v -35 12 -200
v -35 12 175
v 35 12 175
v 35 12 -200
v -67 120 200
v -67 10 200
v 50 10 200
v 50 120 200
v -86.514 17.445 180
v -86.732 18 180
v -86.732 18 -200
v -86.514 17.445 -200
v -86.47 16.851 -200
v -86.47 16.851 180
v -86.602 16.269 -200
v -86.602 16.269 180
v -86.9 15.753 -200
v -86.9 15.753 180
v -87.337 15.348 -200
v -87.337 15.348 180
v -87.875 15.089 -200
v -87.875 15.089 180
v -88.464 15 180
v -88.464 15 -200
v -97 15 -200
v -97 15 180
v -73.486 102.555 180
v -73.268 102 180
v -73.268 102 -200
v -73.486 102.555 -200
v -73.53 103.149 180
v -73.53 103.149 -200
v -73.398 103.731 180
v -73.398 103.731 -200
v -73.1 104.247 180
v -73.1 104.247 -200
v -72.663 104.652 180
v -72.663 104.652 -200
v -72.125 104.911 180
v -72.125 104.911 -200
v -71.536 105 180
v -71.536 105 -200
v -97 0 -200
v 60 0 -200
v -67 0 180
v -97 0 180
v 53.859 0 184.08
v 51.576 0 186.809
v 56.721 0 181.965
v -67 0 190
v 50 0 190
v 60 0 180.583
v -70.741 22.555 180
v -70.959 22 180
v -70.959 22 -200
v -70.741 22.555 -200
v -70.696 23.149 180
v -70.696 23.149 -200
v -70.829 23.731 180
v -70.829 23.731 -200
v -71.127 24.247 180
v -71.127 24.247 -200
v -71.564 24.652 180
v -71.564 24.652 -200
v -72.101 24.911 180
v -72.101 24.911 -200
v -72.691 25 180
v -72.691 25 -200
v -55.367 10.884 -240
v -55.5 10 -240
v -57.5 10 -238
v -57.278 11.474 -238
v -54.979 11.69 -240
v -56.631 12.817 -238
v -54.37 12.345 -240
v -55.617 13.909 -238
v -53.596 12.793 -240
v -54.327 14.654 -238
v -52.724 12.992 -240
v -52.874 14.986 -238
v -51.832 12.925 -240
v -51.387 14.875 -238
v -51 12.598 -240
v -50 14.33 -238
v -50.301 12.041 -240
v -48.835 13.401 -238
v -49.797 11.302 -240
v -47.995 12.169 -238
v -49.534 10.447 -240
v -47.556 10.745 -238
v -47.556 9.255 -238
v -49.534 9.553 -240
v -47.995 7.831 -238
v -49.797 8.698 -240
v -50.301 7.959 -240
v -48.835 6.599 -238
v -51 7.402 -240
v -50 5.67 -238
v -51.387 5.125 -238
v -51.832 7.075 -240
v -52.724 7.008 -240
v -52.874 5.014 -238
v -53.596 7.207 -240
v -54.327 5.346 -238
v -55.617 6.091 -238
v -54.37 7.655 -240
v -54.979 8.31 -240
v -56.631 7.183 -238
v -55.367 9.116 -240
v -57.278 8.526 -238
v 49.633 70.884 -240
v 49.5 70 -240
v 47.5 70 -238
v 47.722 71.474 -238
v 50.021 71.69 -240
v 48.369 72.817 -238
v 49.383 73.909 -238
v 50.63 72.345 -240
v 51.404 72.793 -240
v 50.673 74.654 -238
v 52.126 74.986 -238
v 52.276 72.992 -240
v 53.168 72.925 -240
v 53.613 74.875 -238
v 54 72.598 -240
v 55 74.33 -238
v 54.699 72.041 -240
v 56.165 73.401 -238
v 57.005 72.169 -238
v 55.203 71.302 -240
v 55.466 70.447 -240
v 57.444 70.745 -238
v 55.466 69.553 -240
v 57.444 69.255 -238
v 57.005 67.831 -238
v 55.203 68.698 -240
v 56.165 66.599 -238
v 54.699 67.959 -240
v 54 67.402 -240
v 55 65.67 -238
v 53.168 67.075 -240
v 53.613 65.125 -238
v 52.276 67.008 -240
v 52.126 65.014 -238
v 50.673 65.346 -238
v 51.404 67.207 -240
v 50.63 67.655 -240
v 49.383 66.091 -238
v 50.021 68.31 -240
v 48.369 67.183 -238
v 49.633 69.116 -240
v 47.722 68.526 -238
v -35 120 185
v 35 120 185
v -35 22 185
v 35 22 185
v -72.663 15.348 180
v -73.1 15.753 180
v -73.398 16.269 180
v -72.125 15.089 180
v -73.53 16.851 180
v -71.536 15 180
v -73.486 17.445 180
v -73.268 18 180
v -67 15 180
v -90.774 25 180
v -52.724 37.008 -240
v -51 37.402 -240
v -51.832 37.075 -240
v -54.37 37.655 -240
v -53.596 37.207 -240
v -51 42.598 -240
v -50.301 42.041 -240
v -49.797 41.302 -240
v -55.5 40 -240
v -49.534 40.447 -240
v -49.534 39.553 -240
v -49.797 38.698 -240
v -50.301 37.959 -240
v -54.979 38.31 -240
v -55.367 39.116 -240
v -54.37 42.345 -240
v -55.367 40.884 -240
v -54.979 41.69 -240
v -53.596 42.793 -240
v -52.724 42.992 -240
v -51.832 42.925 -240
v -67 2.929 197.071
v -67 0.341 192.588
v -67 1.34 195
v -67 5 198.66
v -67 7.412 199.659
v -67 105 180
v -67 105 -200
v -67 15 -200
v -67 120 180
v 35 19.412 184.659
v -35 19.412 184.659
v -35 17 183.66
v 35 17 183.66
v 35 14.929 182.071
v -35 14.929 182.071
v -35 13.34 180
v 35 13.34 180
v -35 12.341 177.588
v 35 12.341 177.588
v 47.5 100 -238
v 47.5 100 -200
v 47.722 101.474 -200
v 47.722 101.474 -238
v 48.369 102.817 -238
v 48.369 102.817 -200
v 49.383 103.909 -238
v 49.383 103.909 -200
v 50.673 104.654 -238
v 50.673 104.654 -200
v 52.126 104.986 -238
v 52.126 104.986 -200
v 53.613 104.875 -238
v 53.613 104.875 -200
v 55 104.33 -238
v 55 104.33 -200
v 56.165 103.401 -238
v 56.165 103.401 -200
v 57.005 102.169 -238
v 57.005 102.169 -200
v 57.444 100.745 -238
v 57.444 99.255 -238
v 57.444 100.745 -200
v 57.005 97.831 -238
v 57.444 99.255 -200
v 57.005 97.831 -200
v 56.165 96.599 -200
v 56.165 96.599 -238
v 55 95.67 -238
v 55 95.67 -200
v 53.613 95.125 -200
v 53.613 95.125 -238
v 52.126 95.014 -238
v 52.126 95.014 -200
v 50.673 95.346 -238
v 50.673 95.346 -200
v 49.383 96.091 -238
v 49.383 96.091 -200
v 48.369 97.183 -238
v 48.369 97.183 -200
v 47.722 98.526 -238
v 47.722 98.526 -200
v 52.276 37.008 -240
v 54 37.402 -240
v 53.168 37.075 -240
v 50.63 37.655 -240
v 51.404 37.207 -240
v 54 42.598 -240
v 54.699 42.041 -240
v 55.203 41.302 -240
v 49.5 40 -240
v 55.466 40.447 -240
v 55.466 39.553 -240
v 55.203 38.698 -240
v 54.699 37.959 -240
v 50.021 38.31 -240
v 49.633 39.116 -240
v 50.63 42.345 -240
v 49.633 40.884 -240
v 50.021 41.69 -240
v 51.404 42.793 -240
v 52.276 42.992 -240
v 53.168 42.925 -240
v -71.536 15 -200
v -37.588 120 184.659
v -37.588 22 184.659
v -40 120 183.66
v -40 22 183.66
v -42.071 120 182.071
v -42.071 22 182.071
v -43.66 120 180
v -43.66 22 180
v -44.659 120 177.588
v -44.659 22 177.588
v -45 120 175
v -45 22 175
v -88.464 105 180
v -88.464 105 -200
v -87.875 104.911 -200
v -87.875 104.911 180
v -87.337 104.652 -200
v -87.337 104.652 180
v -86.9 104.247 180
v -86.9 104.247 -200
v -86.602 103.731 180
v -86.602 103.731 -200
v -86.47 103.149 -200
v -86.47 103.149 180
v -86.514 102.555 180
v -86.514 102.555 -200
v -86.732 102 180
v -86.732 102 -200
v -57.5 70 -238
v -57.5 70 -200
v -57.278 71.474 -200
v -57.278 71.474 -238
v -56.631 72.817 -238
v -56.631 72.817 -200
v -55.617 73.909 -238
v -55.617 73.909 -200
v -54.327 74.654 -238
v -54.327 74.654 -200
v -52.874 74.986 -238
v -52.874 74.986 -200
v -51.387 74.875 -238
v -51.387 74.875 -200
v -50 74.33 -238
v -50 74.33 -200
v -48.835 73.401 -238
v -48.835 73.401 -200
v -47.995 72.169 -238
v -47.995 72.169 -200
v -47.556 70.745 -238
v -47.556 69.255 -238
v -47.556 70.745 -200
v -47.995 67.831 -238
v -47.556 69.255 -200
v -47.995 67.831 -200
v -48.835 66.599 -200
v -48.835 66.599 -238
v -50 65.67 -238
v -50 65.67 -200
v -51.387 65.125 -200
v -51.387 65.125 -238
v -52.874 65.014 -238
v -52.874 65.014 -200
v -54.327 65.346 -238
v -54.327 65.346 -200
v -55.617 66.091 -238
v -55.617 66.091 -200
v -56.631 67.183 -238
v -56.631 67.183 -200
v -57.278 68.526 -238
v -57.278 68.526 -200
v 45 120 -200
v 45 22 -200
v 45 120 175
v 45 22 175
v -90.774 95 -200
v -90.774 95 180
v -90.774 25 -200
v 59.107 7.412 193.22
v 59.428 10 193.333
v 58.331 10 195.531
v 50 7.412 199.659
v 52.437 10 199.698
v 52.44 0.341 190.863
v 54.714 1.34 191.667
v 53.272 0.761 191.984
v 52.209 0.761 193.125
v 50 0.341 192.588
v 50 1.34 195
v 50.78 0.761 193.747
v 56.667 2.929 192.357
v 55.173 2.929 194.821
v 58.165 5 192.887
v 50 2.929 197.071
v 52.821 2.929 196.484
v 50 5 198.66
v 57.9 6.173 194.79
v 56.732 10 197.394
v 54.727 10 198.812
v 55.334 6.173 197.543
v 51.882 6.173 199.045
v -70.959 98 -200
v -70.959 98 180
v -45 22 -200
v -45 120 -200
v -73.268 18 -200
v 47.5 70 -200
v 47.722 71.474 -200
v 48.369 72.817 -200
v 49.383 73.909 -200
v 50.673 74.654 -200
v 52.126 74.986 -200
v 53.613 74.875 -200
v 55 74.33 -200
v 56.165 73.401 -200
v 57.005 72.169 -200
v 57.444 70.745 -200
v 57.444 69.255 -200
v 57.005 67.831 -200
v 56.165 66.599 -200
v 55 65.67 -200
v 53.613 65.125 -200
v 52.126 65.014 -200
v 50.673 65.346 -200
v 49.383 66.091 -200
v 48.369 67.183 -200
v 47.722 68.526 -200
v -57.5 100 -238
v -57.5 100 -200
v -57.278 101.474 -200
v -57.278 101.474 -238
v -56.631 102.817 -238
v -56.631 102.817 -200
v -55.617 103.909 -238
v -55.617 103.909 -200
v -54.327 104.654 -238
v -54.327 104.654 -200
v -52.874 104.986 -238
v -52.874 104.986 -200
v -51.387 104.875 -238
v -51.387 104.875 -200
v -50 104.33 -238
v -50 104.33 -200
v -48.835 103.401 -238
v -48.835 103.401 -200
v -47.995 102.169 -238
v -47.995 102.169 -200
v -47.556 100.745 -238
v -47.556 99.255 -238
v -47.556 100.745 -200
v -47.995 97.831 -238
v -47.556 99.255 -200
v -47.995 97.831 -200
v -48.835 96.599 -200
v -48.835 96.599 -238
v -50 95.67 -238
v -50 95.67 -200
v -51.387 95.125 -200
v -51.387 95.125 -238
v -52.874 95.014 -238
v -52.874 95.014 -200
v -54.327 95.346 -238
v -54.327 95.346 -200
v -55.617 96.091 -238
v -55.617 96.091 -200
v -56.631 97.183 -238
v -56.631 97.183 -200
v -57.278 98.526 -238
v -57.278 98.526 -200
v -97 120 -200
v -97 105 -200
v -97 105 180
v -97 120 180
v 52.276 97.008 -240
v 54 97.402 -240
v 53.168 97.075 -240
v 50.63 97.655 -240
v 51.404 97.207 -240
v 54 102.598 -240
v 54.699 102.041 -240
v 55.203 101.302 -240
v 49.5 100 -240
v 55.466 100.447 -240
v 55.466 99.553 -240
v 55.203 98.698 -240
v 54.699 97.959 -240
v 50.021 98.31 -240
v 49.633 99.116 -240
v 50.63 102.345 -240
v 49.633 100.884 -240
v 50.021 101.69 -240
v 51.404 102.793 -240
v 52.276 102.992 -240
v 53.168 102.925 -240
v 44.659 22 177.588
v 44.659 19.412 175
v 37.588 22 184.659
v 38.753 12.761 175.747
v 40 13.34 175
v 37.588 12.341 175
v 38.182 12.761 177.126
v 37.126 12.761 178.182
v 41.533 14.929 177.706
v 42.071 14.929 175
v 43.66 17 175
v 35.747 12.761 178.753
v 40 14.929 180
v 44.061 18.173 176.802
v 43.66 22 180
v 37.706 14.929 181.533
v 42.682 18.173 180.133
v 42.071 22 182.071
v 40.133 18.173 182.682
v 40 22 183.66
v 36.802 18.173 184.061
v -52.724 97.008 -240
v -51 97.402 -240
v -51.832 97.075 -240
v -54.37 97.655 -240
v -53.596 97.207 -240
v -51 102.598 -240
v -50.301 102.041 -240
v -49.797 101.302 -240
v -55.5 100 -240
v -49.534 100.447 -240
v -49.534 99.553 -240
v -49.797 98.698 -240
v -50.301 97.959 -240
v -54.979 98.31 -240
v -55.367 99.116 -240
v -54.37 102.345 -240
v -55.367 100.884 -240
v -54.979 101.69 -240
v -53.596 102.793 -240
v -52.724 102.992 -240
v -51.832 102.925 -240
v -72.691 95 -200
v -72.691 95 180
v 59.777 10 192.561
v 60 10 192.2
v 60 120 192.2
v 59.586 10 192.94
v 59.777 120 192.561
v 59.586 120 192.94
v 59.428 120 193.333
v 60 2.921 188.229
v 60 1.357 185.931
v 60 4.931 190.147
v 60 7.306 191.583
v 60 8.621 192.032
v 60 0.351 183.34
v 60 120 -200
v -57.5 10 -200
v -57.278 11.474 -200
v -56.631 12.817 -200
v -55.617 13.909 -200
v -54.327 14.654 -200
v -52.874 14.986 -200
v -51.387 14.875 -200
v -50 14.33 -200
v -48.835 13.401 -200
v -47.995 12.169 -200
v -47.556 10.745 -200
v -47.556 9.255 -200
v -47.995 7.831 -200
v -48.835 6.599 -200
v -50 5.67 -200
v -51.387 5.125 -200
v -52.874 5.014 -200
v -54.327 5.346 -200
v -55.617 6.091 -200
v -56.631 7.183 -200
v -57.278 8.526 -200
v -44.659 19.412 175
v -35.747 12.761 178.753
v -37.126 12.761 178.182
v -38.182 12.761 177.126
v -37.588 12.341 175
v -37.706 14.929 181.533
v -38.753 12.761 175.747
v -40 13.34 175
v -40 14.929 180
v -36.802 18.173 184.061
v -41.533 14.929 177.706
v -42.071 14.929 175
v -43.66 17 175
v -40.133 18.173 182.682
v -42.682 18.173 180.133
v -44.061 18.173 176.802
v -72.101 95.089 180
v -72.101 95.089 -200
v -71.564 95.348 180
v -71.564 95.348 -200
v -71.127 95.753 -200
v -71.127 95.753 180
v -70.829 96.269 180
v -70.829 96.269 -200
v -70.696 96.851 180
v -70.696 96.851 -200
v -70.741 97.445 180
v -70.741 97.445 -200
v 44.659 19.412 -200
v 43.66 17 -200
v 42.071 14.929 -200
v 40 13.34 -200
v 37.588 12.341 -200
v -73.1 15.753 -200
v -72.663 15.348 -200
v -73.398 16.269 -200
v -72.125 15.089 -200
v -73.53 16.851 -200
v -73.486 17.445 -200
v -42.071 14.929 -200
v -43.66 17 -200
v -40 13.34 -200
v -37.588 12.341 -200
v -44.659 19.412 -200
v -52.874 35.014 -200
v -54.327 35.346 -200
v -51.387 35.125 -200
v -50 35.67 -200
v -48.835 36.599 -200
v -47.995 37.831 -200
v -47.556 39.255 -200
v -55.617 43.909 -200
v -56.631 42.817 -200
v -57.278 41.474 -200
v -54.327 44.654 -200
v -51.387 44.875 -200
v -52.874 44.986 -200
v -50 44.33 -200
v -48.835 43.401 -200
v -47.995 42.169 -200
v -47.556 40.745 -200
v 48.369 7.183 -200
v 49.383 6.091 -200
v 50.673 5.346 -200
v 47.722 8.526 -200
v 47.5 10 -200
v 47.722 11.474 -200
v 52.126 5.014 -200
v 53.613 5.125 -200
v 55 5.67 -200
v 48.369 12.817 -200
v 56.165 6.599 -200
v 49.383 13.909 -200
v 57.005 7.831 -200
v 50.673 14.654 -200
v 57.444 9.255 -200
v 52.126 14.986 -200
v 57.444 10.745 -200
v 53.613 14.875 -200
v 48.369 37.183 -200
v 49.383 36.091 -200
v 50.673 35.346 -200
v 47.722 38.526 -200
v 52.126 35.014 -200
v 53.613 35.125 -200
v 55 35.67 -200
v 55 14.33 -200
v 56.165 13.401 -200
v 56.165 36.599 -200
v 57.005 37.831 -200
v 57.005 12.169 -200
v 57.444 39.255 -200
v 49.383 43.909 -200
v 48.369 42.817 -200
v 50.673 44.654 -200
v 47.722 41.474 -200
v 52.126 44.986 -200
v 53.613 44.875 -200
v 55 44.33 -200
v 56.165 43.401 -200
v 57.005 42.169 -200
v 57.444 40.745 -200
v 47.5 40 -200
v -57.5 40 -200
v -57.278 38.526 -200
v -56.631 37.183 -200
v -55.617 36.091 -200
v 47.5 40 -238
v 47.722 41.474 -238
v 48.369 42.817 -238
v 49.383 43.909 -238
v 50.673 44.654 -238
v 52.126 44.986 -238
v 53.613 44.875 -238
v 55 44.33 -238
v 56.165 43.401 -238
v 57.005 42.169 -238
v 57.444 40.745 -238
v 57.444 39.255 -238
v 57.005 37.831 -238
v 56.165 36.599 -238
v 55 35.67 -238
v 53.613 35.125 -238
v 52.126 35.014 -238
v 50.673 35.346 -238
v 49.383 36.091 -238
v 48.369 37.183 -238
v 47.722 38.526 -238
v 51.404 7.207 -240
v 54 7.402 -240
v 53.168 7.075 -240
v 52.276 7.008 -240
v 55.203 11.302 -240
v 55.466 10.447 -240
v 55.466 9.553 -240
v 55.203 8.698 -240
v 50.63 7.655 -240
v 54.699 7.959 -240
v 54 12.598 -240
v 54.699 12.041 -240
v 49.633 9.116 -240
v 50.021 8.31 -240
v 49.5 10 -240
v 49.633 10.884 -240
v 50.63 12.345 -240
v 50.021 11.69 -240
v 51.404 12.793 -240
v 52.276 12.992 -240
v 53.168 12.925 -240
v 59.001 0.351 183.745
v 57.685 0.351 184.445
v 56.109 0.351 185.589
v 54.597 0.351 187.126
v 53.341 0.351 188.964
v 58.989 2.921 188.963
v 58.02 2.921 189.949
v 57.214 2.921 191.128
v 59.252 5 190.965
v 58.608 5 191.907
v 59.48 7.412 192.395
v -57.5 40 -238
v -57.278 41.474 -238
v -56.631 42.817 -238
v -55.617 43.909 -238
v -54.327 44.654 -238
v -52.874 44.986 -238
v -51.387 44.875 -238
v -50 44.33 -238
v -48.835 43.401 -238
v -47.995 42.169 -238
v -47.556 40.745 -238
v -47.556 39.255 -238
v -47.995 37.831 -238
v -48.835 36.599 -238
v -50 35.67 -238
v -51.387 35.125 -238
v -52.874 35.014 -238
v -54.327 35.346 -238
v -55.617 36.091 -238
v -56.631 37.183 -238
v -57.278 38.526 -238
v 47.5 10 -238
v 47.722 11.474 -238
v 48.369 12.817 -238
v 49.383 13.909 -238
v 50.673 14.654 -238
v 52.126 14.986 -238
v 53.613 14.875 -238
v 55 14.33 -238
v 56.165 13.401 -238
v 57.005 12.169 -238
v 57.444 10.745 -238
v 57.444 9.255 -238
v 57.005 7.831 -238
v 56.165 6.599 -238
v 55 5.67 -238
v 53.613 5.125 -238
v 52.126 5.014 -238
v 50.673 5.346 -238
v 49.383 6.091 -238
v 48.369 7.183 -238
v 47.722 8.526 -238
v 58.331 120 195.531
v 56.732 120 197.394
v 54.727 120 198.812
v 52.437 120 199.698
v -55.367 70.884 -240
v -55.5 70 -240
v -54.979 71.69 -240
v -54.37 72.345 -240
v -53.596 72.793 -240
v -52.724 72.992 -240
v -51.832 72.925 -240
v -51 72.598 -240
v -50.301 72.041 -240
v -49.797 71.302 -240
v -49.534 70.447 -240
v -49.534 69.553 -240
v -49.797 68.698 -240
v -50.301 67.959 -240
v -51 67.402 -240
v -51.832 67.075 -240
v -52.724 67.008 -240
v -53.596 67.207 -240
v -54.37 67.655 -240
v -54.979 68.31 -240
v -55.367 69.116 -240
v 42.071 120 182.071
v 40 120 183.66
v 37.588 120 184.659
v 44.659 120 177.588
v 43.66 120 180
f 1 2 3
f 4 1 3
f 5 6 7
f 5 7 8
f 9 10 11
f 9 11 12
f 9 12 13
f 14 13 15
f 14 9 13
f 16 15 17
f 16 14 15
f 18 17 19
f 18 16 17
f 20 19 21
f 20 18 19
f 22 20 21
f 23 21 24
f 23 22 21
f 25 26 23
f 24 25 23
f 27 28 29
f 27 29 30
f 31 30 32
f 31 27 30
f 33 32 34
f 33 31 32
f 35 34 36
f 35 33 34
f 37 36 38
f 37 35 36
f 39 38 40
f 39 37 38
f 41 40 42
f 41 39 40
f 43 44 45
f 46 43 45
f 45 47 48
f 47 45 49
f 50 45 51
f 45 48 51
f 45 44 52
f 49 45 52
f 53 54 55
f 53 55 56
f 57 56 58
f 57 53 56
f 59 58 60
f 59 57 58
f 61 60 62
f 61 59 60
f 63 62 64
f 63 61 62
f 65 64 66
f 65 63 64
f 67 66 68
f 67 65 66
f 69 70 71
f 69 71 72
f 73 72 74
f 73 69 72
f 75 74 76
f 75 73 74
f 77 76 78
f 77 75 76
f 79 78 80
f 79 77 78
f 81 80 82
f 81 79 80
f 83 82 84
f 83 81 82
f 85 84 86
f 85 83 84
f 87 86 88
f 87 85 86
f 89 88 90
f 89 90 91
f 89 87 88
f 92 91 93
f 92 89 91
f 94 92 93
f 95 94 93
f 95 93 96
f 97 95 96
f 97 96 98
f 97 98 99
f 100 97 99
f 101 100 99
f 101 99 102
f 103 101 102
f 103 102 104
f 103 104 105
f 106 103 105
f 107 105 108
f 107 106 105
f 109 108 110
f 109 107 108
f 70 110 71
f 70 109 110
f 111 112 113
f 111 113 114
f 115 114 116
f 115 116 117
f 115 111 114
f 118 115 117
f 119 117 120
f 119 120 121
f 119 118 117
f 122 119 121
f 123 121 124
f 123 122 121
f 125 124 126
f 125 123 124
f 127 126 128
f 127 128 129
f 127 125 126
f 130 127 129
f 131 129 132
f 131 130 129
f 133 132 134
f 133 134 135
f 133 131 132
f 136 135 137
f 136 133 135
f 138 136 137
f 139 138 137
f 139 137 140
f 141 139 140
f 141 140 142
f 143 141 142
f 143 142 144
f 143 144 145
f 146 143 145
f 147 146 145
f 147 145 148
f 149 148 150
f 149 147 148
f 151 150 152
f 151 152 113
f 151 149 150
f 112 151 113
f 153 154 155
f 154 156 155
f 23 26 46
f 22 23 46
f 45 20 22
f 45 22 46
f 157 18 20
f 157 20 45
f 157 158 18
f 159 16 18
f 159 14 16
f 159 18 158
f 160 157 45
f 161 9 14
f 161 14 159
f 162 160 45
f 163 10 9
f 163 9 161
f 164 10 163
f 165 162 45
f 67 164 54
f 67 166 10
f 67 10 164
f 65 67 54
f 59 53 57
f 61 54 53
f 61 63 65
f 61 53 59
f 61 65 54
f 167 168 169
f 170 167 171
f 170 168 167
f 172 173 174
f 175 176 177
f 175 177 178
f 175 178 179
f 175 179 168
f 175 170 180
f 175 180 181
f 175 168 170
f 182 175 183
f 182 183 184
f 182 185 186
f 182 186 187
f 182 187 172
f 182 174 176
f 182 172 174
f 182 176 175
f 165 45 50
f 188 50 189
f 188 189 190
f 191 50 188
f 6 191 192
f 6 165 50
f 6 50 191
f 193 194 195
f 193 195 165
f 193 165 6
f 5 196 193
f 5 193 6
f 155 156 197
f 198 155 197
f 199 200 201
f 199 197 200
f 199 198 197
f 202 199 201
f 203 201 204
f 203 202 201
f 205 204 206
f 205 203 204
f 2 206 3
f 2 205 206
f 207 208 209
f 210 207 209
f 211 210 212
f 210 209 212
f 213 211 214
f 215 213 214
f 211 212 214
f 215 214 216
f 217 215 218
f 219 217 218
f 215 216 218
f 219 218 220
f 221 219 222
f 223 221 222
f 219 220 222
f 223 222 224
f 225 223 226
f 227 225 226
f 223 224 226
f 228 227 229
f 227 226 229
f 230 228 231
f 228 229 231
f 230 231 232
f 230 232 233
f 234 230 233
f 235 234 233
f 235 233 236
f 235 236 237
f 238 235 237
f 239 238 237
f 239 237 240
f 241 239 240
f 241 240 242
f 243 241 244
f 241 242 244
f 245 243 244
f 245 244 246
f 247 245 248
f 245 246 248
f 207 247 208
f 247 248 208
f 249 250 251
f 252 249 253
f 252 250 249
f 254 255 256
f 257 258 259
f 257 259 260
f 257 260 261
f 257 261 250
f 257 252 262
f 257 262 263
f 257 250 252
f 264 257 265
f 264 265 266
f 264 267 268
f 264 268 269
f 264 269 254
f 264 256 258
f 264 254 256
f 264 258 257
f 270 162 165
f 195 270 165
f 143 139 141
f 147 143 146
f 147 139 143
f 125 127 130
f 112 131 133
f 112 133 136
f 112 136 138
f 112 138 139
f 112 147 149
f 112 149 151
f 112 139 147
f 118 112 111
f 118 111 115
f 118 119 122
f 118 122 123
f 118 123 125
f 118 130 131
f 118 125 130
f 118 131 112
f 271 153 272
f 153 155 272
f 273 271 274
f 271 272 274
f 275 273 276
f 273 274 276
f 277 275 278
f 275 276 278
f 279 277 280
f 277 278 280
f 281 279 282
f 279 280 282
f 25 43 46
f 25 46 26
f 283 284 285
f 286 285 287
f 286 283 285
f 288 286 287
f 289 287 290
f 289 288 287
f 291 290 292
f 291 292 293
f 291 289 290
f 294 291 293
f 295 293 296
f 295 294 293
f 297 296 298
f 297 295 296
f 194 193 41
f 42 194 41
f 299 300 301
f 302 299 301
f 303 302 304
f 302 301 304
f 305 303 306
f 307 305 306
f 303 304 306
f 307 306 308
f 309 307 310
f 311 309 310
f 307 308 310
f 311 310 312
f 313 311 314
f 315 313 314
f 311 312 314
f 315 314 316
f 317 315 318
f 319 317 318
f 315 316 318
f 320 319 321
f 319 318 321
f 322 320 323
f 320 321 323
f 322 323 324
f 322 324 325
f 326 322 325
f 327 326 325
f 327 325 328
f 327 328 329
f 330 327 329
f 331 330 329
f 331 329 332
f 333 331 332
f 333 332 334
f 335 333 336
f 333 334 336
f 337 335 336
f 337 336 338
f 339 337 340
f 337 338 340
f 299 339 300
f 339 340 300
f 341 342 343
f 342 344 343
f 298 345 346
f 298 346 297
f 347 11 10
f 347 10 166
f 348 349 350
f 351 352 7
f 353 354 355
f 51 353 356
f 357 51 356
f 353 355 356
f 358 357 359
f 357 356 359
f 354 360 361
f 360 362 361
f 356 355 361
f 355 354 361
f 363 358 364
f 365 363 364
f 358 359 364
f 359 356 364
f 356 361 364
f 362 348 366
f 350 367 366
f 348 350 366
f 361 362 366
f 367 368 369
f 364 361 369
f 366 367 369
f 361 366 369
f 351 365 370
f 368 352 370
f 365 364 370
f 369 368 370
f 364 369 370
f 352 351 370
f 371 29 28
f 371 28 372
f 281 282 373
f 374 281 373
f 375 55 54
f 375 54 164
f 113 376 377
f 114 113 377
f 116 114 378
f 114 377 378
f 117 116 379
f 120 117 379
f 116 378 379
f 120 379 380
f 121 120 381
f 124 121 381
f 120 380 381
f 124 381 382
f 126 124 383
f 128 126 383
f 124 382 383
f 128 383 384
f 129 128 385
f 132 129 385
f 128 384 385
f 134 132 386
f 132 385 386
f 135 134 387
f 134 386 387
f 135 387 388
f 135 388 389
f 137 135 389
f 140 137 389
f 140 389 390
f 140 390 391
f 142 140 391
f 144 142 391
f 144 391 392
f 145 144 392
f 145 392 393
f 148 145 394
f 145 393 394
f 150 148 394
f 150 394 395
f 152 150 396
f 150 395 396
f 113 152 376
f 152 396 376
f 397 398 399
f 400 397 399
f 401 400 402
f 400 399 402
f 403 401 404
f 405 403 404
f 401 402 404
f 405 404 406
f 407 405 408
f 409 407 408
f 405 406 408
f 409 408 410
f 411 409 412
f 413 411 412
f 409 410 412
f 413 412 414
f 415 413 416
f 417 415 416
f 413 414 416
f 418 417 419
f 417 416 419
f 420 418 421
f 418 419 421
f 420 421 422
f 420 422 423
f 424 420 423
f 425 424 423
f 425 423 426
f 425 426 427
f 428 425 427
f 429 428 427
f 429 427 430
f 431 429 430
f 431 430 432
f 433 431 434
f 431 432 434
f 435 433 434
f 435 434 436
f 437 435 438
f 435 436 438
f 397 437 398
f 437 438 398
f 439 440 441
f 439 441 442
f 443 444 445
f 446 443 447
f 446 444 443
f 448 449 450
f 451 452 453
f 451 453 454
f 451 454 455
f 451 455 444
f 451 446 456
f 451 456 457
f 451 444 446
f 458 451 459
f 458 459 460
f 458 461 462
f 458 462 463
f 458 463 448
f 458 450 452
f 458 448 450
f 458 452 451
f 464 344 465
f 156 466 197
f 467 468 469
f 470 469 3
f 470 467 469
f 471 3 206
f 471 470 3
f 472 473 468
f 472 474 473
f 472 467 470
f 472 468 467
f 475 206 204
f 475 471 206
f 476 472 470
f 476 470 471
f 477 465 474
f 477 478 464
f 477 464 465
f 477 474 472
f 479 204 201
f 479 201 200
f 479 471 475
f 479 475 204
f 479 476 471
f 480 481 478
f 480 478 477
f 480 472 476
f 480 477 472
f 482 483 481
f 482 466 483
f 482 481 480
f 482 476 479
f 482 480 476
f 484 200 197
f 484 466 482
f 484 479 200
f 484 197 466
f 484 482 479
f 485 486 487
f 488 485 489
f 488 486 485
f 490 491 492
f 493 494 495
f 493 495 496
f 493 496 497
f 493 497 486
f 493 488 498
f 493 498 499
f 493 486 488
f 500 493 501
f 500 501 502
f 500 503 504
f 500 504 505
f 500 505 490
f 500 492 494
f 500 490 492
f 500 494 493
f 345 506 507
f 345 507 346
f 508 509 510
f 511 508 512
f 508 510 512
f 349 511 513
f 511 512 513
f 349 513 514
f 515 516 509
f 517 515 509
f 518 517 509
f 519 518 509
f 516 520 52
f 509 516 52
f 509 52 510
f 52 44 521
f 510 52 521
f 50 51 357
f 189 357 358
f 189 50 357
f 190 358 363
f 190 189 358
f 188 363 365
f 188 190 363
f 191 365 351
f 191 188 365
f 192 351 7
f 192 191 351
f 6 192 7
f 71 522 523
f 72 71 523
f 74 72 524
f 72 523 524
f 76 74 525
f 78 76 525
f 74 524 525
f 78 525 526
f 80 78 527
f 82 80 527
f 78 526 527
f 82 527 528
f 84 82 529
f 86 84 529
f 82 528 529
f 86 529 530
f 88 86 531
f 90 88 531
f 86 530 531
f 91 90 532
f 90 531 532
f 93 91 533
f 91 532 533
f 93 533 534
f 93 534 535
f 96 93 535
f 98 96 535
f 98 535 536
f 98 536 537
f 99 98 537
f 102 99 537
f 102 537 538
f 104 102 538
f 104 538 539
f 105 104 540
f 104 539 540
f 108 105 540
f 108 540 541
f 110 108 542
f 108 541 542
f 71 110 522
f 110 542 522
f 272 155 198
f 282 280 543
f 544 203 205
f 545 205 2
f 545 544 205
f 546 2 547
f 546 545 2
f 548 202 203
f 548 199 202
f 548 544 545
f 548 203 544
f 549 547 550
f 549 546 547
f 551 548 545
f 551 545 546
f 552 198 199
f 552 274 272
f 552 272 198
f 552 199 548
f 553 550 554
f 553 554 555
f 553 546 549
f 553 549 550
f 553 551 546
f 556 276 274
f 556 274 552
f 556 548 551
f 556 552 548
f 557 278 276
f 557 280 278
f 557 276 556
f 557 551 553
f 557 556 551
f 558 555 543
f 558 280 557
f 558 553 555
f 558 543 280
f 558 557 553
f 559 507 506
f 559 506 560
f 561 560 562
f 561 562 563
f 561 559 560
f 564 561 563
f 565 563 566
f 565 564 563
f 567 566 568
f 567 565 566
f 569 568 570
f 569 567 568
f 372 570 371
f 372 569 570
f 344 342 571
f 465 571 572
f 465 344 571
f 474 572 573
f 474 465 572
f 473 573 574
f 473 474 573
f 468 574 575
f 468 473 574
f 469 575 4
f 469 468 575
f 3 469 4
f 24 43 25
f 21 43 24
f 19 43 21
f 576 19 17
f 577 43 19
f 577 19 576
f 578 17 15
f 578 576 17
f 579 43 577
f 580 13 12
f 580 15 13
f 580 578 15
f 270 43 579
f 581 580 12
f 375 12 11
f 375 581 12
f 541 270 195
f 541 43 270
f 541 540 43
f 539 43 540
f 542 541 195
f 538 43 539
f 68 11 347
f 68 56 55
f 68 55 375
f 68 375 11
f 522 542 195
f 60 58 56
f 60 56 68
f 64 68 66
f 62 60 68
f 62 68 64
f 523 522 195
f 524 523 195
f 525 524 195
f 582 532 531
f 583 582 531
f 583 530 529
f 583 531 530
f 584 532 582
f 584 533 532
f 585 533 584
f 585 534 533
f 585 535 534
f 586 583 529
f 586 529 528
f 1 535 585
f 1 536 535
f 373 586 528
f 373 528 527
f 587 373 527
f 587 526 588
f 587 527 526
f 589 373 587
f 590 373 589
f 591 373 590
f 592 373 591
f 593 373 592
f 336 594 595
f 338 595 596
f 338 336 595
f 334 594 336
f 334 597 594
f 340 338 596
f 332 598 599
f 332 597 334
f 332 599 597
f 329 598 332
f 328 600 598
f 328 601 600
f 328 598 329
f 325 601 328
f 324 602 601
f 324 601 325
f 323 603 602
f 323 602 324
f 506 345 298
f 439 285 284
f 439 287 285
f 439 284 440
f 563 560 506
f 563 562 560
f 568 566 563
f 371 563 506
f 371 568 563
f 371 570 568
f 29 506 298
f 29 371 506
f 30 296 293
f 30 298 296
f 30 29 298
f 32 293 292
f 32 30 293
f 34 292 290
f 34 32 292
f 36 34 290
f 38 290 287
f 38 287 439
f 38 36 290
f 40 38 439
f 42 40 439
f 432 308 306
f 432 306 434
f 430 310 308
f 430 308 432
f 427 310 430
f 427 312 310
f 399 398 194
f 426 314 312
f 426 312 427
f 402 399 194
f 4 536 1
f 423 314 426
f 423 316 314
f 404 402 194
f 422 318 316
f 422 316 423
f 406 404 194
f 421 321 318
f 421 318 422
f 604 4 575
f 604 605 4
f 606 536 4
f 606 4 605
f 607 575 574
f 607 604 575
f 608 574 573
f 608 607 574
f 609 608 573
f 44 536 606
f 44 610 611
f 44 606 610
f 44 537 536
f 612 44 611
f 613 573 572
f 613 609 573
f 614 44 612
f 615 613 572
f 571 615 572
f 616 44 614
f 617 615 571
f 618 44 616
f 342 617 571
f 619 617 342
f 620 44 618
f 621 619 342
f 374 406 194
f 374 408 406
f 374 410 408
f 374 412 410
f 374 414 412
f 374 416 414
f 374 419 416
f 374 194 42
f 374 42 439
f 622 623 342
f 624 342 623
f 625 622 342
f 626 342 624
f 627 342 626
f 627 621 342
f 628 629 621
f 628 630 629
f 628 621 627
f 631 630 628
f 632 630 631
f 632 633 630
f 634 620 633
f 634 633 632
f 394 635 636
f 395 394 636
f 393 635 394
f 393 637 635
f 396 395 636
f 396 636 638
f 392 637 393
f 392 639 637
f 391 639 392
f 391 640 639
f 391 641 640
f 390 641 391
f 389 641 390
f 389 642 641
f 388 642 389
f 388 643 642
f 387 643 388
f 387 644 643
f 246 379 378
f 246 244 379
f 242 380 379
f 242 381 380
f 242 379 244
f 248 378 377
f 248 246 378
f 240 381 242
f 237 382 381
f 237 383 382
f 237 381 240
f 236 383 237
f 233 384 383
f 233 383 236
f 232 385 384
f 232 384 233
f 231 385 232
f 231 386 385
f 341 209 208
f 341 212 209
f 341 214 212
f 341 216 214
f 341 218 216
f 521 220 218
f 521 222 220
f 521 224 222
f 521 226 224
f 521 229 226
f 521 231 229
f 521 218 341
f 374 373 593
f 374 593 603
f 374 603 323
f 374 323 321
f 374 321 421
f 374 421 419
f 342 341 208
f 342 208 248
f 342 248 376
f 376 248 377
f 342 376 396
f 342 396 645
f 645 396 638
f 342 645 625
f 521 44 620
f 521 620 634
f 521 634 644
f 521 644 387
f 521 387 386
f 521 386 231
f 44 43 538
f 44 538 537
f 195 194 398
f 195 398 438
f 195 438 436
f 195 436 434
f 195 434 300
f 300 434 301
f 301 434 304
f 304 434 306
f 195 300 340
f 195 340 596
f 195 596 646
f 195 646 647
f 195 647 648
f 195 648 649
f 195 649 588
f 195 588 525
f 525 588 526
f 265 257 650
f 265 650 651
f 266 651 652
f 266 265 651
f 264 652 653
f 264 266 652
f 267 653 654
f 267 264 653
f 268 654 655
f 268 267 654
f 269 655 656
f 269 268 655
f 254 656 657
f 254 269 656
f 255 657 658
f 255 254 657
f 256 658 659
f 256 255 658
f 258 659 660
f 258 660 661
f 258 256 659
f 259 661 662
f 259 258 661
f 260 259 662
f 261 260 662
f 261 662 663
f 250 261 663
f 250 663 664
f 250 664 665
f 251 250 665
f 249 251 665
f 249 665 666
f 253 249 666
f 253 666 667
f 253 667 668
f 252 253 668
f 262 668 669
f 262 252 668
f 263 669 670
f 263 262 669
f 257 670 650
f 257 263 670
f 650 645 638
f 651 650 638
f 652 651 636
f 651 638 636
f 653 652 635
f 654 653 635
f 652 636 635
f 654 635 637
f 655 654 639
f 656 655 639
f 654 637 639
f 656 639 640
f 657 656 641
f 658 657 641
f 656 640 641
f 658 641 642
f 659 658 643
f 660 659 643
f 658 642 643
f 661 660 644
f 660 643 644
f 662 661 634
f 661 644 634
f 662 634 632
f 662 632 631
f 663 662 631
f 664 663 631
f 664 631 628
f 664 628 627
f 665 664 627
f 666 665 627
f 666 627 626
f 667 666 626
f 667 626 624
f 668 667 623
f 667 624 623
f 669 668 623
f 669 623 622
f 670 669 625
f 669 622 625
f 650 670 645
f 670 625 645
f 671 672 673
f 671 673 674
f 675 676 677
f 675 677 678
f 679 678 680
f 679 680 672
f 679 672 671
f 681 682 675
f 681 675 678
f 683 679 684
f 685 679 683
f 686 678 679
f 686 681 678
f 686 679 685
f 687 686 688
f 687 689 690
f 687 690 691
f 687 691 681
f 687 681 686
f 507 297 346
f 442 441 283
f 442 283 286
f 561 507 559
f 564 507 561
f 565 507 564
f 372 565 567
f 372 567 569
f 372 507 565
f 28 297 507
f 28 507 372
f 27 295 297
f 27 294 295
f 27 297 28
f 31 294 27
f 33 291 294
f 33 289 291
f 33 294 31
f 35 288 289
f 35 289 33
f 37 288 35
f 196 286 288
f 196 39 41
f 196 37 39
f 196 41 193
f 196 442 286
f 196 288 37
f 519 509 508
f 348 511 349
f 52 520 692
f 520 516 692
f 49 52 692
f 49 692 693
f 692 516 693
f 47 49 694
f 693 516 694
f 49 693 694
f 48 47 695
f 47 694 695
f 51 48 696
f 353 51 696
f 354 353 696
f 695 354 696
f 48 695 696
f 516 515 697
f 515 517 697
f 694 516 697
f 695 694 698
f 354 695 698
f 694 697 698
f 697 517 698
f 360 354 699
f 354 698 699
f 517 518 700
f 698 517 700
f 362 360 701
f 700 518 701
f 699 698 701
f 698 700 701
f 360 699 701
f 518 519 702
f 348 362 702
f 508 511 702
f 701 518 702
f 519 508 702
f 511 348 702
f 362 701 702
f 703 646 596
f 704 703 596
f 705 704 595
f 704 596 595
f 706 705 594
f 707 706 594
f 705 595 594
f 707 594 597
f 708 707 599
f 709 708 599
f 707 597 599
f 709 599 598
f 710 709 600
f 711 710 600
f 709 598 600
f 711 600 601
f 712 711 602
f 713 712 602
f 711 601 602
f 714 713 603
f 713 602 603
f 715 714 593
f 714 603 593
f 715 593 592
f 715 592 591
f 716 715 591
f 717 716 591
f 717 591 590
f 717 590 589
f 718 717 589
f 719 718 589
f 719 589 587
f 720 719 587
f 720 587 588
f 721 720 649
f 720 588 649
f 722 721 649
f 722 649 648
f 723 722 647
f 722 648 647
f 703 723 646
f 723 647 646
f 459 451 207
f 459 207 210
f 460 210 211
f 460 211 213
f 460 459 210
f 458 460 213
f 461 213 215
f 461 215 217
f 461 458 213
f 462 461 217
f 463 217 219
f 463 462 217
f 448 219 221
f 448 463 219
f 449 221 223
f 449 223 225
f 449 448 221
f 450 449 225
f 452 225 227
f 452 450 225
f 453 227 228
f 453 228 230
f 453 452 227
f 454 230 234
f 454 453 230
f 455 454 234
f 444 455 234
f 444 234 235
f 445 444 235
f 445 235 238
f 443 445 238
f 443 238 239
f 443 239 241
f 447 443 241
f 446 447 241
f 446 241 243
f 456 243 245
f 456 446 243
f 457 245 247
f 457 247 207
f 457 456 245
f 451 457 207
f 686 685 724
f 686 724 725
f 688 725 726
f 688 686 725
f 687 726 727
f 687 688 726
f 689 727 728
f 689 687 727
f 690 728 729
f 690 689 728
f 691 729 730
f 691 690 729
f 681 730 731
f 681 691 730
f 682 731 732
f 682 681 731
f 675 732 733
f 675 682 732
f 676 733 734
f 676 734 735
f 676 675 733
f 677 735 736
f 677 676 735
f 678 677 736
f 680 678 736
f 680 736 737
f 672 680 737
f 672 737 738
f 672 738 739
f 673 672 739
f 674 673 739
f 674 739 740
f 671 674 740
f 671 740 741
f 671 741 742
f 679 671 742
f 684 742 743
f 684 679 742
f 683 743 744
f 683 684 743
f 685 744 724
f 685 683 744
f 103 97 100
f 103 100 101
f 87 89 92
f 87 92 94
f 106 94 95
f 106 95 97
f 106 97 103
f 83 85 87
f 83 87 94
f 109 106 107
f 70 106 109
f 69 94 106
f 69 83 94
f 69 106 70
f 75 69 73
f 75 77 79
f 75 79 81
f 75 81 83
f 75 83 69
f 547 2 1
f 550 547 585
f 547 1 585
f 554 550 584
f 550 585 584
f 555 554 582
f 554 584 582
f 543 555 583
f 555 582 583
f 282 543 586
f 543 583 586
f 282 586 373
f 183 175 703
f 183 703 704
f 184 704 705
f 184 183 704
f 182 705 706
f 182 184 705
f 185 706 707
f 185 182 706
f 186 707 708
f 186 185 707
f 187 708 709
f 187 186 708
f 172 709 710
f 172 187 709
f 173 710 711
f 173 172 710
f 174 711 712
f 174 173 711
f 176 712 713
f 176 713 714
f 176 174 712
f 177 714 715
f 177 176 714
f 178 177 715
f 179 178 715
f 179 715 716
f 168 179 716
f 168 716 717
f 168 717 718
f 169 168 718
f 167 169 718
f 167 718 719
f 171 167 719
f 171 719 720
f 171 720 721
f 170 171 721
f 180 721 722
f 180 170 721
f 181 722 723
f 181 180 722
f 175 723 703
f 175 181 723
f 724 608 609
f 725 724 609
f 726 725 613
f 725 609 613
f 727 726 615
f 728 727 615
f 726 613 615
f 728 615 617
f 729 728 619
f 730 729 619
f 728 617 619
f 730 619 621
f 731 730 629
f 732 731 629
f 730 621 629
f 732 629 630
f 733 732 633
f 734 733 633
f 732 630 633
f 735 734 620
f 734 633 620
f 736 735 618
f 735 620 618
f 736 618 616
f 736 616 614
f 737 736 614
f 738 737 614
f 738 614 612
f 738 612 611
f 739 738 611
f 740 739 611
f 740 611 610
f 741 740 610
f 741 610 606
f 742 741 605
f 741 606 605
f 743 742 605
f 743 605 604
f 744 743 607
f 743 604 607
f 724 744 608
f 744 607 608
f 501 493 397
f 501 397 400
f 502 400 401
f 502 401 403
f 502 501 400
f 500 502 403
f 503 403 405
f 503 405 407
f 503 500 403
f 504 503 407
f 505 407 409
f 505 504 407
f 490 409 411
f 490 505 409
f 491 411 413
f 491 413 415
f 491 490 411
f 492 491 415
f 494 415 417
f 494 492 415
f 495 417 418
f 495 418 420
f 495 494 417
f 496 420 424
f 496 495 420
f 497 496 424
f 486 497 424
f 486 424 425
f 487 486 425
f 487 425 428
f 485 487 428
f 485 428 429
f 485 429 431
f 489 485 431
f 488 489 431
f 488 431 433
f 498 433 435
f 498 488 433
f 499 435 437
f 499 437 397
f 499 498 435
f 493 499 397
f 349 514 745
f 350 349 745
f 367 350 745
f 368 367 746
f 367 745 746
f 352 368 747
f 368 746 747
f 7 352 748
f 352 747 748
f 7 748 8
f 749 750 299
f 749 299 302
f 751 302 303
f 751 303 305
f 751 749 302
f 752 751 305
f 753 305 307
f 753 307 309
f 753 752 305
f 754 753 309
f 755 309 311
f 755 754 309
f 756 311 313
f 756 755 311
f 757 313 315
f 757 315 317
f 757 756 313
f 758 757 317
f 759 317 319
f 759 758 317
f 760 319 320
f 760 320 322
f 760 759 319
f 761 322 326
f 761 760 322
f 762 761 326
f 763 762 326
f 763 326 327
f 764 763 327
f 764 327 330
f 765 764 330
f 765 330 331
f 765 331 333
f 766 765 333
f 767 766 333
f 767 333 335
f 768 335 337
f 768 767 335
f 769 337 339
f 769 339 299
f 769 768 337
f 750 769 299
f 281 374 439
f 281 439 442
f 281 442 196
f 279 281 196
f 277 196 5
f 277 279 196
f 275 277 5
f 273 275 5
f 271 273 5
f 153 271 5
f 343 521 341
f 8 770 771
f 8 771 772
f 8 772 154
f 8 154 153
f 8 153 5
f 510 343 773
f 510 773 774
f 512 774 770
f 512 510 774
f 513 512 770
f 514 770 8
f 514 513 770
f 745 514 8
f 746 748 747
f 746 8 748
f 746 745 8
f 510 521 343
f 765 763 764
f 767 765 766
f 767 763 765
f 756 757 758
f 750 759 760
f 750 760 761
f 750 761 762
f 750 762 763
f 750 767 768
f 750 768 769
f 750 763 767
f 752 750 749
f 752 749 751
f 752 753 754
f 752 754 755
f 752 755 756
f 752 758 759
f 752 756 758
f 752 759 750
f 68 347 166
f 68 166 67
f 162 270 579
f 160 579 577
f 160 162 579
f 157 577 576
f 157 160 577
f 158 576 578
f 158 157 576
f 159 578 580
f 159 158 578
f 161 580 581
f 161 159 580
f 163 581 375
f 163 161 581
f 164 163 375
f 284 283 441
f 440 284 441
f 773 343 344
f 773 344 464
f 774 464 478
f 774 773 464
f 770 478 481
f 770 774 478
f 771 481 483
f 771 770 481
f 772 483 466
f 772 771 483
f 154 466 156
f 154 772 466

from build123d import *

# Parameters (mm, degrees)
SURFACE_EXTRUDE1_1_DEPTH = 120
THICKEN1_T2              = 15
SKETCH5_W                = 90
SKETCH5_H                = 120
CUT_EXTRUDE1_DEPTH       = 120
SKETCH4_W                = 120
SKETCH4_H                = 400
THICKEN2_T1              = 12
FILLET1_R                = 10
FILLET2_R                = 10
SKETCH6_R                = 5
BOSS_EXTRUDE1_DEPTH      = 40
CHAMFER1_SIZE            = 2
CHAMFER2_SIZE            = 2
SKETCH7_W                = 390
SKETCH7_H                = 120
BOSS_EXTRUDE2_DEPTH      = 40
CUT_EXTRUDE2_DEPTH       = 422
FILLET3_R                = 5
SKETCH9_W                = 3
SKETCH9_H                = 120
CUT_EXTRUDE3_DEPTH       = 440
FILLET4_R                = 2
FILLET5_R                = 2
FILLET6_R                = 2
SKETCH12_W               = 37
SKETCH12_H               = 120
CUT_EXTRUDE5_DEPTH       = 413
SKETCH13_W               = 30
SKETCH13_H               = 120
CUT_EXTRUDE6_DEPTH       = 20
SKETCH14_W               = 10
SKETCH14_H               = 120
BOSS_EXTRUDE3_DEPTH      = 7
FILLET7_R                = 10


with BuildPart() as body_1:
    # Surface-Extrude1: a surface, the sketch's curves swept straight by 120 mm
    with BuildLine(Plane(origin=(0, 0, 0), x_dir=(1, 0, 0), z_dir=(0, 1, 0)), mode=Mode.PRIVATE) as surface_extrude1_1_path:
        Line((60, -200), (-60, -200))
        Line((-60, -200), (-60, 200))
        Line((-60, 200), (60, 200))
        Line((60, 200), (60, -200))
    surface_extrude1_1 = Shell.extrude(surface_extrude1_1_path.wire(), (0 * SURFACE_EXTRUDE1_1_DEPTH, 1 * SURFACE_EXTRUDE1_1_DEPTH, 0 * SURFACE_EXTRUDE1_1_DEPTH))
    add(Solid.thicken(surface_extrude1_1, -THICKEN1_T2))

    # Sketch5 → Cut-Extrude1 (cut)
    with BuildSketch(Plane.XY.offset(-185)):
        with Locations((0, 60)):
            Rectangle(SKETCH5_W, SKETCH5_H)
    extrude(amount=-CUT_EXTRUDE1_DEPTH, mode=Mode.SUBTRACT)

    # Sketch4 → Surface-Plane1: a flat surface bounded by the sketch
    with BuildSketch(Plane(origin=(0, 0, 0), x_dir=(1, 0, 0), z_dir=(0, 1, 0)), mode=Mode.PRIVATE) as surface_plane1_2_region:
        Rectangle(SKETCH4_W, SKETCH4_H)
    surface_plane1_2 = surface_plane1_2_region.sketch.faces()[0]
    add(Solid.thicken(surface_plane1_2, THICKEN2_T1))

    # Fillet1
    fillet1_edges = [body_1.edges().sort_by_distance(p)[0] for p in [
        (45, 66, 185),
        (45, 12, -7.5),
        (-45, 66, 185),
        (0, 12, 185),
        (-45, 12, -7.5),
    ]]
    fillet(fillet1_edges, radius=FILLET1_R)

    # Fillet2
    fillet2_edges = [body_1.edges().sort_by_distance(p)[0] for p in [
        (60, 60, 200),
    ]]
    fillet(fillet2_edges, radius=FILLET2_R)

    # Sketch6 → Boss-Extrude1 (add)
    with BuildSketch(Plane(origin=(0, 0, -200), x_dir=(-1, 0, 0), z_dir=(0, 0, -1))):
        with Locations((-52.5, 100)):
            Circle(SKETCH6_R)
        with Locations((52.5, 100)):
            Circle(SKETCH6_R)
        with Locations((-52.5, 70)):
            Circle(SKETCH6_R)
        with Locations((-52.5, 40)):
            Circle(SKETCH6_R)
        with Locations((-52.5, 10)):
            Circle(SKETCH6_R)
        with Locations((52.5, 70)):
            Circle(SKETCH6_R)
        with Locations((52.5, 40)):
            Circle(SKETCH6_R)
        with Locations((52.5, 10)):
            Circle(SKETCH6_R)
    extrude(amount=BOSS_EXTRUDE1_DEPTH)

    # Chamfer1
    chamfer1_edges = [body_1.edges().sort_by_distance(p)[0] for p in [
        (57.5, 100, -240),
        (57.5, 70, -240),
        (57.5, 40, -240),
        (57.5, 10, -240),
    ]]
    chamfer(chamfer1_edges, length=CHAMFER1_SIZE)

    # Chamfer2
    chamfer2_edges = [body_1.edges().sort_by_distance(p)[0] for p in [
        (-47.5, 100, -240),
        (-47.5, 70, -240),
        (-47.5, 40, -240),
        (-47.5, 10, -240),
    ]]
    chamfer(chamfer2_edges, length=CHAMFER2_SIZE)

    # Sketch7 → Boss-Extrude2 (add)
    with BuildSketch(Plane(origin=(60, 0, 0), x_dir=(0, 0, -1), z_dir=(1, 0, 0))):
        with Locations((5, 60)):
            Rectangle(SKETCH7_W, SKETCH7_H)
    boss_extrude2 = extrude(amount=BOSS_EXTRUDE2_DEPTH)

    # Sketch8 → Cut-Extrude2 (cut)
    with BuildSketch(Plane(origin=(0, 0, -200), x_dir=(-1, 0, 0), z_dir=(0, 0, -1))):
        Polygon((-100, 105), (-100, 15), (-85, 15), (-90.773502692, 25), (-69.226497308, 25), (-75, 15), (-67, 15), (-67, 105), (-75, 105), (-69.226497308, 95), (-90.773502692, 95), (-85, 105), align=None)
    cut_extrude2 = extrude(amount=-CUT_EXTRUDE2_DEPTH, mode=Mode.SUBTRACT)

    # Fillet3
    fillet3_edges = [body_1.edges().sort_by_distance(p)[0] for p in [
        (60, 60, 190),
    ]]
    fillet(fillet3_edges, radius=FILLET3_R)

    # Sketch9 → Cut-Extrude3 (cut)
    with BuildSketch(Plane(origin=(0, 0, -200), x_dir=(-1, 0, 0), z_dir=(0, 0, -1))):
        with Locations((-98.5, 60)):
            Rectangle(SKETCH9_W, SKETCH9_H)
    cut_extrude3 = extrude(amount=-CUT_EXTRUDE3_DEPTH, mode=Mode.SUBTRACT)

    # Fillet4
    fillet4_edges = [body_1.edges().sort_by_distance(p)[0] for p in [
        (85, 105, -5),
        (75, 105, -5),
        (75, 15, -5),
        (85, 15, -5),
    ]]
    fillet(fillet4_edges, radius=FILLET4_R)

    # Fillet5
    fillet5_edges = [body_1.edges().sort_by_distance(p)[0] for p in [
        (69.226497308, 25, -5),
        (69.226497308, 95, -5),
    ]]
    fillet(fillet5_edges, radius=FILLET5_R)

    # Mirror1: Boss-Extrude2 across plane
    add(boss_extrude2.mirror(Plane(origin=(0, 0, 0), x_dir=(0, 0, 1), z_dir=(1, 0, 0))))

    # Mirror2: Cut-Extrude2 across plane
    add(cut_extrude2.mirror(Plane(origin=(0, 0, 0), x_dir=(0, 0, 1), z_dir=(1, 0, 0))), mode=Mode.SUBTRACT)

    # Fillet6
    fillet6_edges = [body_1.edges().sort_by_distance(p)[0] for p in [
        (-69.226497308, 25, -5),
        (-75, 15, -5),
        (-75, 105, -5),
        (-69.226497308, 95, -5),
        (-85, 105, -5),
        (-85, 15, -5),
    ]]
    fillet(fillet6_edges, radius=FILLET6_R)

    # Sketch12 → Cut-Extrude5 (cut)
    with BuildSketch(Plane(origin=(0, 0, -200), x_dir=(-1, 0, 0), z_dir=(0, 0, -1))):
        with Locations((-78.5, 60)):
            Rectangle(SKETCH12_W, SKETCH12_H)
    extrude(amount=-CUT_EXTRUDE5_DEPTH, mode=Mode.SUBTRACT)

    # Mirror3: Cut-Extrude3 across plane
    add(cut_extrude3.mirror(Plane(origin=(0, 0, 0), x_dir=(0, 0, 1), z_dir=(1, 0, 0))), mode=Mode.SUBTRACT)

    # Sketch13 → Cut-Extrude6 (cut)
    with BuildSketch(Plane.XY.offset(180)):
        with Locations((-82, 60)):
            Rectangle(SKETCH13_W, SKETCH13_H)
    extrude(amount=CUT_EXTRUDE6_DEPTH, mode=Mode.SUBTRACT)

    # Sketch14 → Boss-Extrude3 (add)
    with BuildSketch(Plane.ZY.offset(60)):
        with Locations((195, 60)):
            Rectangle(SKETCH14_W, SKETCH14_H)
    extrude(amount=BOSS_EXTRUDE3_DEPTH)

    # Fillet7
    fillet7_edges = [body_1.edges().sort_by_distance(p)[0] for p in [
        (-8.5, 0, 200),
        (55.773502692, 0, 198.164965809),
        (59.677903287, 0, 192.748194137),
    ]]
    fillet(fillet7_edges, radius=FILLET7_R)


solid = body_1.part
